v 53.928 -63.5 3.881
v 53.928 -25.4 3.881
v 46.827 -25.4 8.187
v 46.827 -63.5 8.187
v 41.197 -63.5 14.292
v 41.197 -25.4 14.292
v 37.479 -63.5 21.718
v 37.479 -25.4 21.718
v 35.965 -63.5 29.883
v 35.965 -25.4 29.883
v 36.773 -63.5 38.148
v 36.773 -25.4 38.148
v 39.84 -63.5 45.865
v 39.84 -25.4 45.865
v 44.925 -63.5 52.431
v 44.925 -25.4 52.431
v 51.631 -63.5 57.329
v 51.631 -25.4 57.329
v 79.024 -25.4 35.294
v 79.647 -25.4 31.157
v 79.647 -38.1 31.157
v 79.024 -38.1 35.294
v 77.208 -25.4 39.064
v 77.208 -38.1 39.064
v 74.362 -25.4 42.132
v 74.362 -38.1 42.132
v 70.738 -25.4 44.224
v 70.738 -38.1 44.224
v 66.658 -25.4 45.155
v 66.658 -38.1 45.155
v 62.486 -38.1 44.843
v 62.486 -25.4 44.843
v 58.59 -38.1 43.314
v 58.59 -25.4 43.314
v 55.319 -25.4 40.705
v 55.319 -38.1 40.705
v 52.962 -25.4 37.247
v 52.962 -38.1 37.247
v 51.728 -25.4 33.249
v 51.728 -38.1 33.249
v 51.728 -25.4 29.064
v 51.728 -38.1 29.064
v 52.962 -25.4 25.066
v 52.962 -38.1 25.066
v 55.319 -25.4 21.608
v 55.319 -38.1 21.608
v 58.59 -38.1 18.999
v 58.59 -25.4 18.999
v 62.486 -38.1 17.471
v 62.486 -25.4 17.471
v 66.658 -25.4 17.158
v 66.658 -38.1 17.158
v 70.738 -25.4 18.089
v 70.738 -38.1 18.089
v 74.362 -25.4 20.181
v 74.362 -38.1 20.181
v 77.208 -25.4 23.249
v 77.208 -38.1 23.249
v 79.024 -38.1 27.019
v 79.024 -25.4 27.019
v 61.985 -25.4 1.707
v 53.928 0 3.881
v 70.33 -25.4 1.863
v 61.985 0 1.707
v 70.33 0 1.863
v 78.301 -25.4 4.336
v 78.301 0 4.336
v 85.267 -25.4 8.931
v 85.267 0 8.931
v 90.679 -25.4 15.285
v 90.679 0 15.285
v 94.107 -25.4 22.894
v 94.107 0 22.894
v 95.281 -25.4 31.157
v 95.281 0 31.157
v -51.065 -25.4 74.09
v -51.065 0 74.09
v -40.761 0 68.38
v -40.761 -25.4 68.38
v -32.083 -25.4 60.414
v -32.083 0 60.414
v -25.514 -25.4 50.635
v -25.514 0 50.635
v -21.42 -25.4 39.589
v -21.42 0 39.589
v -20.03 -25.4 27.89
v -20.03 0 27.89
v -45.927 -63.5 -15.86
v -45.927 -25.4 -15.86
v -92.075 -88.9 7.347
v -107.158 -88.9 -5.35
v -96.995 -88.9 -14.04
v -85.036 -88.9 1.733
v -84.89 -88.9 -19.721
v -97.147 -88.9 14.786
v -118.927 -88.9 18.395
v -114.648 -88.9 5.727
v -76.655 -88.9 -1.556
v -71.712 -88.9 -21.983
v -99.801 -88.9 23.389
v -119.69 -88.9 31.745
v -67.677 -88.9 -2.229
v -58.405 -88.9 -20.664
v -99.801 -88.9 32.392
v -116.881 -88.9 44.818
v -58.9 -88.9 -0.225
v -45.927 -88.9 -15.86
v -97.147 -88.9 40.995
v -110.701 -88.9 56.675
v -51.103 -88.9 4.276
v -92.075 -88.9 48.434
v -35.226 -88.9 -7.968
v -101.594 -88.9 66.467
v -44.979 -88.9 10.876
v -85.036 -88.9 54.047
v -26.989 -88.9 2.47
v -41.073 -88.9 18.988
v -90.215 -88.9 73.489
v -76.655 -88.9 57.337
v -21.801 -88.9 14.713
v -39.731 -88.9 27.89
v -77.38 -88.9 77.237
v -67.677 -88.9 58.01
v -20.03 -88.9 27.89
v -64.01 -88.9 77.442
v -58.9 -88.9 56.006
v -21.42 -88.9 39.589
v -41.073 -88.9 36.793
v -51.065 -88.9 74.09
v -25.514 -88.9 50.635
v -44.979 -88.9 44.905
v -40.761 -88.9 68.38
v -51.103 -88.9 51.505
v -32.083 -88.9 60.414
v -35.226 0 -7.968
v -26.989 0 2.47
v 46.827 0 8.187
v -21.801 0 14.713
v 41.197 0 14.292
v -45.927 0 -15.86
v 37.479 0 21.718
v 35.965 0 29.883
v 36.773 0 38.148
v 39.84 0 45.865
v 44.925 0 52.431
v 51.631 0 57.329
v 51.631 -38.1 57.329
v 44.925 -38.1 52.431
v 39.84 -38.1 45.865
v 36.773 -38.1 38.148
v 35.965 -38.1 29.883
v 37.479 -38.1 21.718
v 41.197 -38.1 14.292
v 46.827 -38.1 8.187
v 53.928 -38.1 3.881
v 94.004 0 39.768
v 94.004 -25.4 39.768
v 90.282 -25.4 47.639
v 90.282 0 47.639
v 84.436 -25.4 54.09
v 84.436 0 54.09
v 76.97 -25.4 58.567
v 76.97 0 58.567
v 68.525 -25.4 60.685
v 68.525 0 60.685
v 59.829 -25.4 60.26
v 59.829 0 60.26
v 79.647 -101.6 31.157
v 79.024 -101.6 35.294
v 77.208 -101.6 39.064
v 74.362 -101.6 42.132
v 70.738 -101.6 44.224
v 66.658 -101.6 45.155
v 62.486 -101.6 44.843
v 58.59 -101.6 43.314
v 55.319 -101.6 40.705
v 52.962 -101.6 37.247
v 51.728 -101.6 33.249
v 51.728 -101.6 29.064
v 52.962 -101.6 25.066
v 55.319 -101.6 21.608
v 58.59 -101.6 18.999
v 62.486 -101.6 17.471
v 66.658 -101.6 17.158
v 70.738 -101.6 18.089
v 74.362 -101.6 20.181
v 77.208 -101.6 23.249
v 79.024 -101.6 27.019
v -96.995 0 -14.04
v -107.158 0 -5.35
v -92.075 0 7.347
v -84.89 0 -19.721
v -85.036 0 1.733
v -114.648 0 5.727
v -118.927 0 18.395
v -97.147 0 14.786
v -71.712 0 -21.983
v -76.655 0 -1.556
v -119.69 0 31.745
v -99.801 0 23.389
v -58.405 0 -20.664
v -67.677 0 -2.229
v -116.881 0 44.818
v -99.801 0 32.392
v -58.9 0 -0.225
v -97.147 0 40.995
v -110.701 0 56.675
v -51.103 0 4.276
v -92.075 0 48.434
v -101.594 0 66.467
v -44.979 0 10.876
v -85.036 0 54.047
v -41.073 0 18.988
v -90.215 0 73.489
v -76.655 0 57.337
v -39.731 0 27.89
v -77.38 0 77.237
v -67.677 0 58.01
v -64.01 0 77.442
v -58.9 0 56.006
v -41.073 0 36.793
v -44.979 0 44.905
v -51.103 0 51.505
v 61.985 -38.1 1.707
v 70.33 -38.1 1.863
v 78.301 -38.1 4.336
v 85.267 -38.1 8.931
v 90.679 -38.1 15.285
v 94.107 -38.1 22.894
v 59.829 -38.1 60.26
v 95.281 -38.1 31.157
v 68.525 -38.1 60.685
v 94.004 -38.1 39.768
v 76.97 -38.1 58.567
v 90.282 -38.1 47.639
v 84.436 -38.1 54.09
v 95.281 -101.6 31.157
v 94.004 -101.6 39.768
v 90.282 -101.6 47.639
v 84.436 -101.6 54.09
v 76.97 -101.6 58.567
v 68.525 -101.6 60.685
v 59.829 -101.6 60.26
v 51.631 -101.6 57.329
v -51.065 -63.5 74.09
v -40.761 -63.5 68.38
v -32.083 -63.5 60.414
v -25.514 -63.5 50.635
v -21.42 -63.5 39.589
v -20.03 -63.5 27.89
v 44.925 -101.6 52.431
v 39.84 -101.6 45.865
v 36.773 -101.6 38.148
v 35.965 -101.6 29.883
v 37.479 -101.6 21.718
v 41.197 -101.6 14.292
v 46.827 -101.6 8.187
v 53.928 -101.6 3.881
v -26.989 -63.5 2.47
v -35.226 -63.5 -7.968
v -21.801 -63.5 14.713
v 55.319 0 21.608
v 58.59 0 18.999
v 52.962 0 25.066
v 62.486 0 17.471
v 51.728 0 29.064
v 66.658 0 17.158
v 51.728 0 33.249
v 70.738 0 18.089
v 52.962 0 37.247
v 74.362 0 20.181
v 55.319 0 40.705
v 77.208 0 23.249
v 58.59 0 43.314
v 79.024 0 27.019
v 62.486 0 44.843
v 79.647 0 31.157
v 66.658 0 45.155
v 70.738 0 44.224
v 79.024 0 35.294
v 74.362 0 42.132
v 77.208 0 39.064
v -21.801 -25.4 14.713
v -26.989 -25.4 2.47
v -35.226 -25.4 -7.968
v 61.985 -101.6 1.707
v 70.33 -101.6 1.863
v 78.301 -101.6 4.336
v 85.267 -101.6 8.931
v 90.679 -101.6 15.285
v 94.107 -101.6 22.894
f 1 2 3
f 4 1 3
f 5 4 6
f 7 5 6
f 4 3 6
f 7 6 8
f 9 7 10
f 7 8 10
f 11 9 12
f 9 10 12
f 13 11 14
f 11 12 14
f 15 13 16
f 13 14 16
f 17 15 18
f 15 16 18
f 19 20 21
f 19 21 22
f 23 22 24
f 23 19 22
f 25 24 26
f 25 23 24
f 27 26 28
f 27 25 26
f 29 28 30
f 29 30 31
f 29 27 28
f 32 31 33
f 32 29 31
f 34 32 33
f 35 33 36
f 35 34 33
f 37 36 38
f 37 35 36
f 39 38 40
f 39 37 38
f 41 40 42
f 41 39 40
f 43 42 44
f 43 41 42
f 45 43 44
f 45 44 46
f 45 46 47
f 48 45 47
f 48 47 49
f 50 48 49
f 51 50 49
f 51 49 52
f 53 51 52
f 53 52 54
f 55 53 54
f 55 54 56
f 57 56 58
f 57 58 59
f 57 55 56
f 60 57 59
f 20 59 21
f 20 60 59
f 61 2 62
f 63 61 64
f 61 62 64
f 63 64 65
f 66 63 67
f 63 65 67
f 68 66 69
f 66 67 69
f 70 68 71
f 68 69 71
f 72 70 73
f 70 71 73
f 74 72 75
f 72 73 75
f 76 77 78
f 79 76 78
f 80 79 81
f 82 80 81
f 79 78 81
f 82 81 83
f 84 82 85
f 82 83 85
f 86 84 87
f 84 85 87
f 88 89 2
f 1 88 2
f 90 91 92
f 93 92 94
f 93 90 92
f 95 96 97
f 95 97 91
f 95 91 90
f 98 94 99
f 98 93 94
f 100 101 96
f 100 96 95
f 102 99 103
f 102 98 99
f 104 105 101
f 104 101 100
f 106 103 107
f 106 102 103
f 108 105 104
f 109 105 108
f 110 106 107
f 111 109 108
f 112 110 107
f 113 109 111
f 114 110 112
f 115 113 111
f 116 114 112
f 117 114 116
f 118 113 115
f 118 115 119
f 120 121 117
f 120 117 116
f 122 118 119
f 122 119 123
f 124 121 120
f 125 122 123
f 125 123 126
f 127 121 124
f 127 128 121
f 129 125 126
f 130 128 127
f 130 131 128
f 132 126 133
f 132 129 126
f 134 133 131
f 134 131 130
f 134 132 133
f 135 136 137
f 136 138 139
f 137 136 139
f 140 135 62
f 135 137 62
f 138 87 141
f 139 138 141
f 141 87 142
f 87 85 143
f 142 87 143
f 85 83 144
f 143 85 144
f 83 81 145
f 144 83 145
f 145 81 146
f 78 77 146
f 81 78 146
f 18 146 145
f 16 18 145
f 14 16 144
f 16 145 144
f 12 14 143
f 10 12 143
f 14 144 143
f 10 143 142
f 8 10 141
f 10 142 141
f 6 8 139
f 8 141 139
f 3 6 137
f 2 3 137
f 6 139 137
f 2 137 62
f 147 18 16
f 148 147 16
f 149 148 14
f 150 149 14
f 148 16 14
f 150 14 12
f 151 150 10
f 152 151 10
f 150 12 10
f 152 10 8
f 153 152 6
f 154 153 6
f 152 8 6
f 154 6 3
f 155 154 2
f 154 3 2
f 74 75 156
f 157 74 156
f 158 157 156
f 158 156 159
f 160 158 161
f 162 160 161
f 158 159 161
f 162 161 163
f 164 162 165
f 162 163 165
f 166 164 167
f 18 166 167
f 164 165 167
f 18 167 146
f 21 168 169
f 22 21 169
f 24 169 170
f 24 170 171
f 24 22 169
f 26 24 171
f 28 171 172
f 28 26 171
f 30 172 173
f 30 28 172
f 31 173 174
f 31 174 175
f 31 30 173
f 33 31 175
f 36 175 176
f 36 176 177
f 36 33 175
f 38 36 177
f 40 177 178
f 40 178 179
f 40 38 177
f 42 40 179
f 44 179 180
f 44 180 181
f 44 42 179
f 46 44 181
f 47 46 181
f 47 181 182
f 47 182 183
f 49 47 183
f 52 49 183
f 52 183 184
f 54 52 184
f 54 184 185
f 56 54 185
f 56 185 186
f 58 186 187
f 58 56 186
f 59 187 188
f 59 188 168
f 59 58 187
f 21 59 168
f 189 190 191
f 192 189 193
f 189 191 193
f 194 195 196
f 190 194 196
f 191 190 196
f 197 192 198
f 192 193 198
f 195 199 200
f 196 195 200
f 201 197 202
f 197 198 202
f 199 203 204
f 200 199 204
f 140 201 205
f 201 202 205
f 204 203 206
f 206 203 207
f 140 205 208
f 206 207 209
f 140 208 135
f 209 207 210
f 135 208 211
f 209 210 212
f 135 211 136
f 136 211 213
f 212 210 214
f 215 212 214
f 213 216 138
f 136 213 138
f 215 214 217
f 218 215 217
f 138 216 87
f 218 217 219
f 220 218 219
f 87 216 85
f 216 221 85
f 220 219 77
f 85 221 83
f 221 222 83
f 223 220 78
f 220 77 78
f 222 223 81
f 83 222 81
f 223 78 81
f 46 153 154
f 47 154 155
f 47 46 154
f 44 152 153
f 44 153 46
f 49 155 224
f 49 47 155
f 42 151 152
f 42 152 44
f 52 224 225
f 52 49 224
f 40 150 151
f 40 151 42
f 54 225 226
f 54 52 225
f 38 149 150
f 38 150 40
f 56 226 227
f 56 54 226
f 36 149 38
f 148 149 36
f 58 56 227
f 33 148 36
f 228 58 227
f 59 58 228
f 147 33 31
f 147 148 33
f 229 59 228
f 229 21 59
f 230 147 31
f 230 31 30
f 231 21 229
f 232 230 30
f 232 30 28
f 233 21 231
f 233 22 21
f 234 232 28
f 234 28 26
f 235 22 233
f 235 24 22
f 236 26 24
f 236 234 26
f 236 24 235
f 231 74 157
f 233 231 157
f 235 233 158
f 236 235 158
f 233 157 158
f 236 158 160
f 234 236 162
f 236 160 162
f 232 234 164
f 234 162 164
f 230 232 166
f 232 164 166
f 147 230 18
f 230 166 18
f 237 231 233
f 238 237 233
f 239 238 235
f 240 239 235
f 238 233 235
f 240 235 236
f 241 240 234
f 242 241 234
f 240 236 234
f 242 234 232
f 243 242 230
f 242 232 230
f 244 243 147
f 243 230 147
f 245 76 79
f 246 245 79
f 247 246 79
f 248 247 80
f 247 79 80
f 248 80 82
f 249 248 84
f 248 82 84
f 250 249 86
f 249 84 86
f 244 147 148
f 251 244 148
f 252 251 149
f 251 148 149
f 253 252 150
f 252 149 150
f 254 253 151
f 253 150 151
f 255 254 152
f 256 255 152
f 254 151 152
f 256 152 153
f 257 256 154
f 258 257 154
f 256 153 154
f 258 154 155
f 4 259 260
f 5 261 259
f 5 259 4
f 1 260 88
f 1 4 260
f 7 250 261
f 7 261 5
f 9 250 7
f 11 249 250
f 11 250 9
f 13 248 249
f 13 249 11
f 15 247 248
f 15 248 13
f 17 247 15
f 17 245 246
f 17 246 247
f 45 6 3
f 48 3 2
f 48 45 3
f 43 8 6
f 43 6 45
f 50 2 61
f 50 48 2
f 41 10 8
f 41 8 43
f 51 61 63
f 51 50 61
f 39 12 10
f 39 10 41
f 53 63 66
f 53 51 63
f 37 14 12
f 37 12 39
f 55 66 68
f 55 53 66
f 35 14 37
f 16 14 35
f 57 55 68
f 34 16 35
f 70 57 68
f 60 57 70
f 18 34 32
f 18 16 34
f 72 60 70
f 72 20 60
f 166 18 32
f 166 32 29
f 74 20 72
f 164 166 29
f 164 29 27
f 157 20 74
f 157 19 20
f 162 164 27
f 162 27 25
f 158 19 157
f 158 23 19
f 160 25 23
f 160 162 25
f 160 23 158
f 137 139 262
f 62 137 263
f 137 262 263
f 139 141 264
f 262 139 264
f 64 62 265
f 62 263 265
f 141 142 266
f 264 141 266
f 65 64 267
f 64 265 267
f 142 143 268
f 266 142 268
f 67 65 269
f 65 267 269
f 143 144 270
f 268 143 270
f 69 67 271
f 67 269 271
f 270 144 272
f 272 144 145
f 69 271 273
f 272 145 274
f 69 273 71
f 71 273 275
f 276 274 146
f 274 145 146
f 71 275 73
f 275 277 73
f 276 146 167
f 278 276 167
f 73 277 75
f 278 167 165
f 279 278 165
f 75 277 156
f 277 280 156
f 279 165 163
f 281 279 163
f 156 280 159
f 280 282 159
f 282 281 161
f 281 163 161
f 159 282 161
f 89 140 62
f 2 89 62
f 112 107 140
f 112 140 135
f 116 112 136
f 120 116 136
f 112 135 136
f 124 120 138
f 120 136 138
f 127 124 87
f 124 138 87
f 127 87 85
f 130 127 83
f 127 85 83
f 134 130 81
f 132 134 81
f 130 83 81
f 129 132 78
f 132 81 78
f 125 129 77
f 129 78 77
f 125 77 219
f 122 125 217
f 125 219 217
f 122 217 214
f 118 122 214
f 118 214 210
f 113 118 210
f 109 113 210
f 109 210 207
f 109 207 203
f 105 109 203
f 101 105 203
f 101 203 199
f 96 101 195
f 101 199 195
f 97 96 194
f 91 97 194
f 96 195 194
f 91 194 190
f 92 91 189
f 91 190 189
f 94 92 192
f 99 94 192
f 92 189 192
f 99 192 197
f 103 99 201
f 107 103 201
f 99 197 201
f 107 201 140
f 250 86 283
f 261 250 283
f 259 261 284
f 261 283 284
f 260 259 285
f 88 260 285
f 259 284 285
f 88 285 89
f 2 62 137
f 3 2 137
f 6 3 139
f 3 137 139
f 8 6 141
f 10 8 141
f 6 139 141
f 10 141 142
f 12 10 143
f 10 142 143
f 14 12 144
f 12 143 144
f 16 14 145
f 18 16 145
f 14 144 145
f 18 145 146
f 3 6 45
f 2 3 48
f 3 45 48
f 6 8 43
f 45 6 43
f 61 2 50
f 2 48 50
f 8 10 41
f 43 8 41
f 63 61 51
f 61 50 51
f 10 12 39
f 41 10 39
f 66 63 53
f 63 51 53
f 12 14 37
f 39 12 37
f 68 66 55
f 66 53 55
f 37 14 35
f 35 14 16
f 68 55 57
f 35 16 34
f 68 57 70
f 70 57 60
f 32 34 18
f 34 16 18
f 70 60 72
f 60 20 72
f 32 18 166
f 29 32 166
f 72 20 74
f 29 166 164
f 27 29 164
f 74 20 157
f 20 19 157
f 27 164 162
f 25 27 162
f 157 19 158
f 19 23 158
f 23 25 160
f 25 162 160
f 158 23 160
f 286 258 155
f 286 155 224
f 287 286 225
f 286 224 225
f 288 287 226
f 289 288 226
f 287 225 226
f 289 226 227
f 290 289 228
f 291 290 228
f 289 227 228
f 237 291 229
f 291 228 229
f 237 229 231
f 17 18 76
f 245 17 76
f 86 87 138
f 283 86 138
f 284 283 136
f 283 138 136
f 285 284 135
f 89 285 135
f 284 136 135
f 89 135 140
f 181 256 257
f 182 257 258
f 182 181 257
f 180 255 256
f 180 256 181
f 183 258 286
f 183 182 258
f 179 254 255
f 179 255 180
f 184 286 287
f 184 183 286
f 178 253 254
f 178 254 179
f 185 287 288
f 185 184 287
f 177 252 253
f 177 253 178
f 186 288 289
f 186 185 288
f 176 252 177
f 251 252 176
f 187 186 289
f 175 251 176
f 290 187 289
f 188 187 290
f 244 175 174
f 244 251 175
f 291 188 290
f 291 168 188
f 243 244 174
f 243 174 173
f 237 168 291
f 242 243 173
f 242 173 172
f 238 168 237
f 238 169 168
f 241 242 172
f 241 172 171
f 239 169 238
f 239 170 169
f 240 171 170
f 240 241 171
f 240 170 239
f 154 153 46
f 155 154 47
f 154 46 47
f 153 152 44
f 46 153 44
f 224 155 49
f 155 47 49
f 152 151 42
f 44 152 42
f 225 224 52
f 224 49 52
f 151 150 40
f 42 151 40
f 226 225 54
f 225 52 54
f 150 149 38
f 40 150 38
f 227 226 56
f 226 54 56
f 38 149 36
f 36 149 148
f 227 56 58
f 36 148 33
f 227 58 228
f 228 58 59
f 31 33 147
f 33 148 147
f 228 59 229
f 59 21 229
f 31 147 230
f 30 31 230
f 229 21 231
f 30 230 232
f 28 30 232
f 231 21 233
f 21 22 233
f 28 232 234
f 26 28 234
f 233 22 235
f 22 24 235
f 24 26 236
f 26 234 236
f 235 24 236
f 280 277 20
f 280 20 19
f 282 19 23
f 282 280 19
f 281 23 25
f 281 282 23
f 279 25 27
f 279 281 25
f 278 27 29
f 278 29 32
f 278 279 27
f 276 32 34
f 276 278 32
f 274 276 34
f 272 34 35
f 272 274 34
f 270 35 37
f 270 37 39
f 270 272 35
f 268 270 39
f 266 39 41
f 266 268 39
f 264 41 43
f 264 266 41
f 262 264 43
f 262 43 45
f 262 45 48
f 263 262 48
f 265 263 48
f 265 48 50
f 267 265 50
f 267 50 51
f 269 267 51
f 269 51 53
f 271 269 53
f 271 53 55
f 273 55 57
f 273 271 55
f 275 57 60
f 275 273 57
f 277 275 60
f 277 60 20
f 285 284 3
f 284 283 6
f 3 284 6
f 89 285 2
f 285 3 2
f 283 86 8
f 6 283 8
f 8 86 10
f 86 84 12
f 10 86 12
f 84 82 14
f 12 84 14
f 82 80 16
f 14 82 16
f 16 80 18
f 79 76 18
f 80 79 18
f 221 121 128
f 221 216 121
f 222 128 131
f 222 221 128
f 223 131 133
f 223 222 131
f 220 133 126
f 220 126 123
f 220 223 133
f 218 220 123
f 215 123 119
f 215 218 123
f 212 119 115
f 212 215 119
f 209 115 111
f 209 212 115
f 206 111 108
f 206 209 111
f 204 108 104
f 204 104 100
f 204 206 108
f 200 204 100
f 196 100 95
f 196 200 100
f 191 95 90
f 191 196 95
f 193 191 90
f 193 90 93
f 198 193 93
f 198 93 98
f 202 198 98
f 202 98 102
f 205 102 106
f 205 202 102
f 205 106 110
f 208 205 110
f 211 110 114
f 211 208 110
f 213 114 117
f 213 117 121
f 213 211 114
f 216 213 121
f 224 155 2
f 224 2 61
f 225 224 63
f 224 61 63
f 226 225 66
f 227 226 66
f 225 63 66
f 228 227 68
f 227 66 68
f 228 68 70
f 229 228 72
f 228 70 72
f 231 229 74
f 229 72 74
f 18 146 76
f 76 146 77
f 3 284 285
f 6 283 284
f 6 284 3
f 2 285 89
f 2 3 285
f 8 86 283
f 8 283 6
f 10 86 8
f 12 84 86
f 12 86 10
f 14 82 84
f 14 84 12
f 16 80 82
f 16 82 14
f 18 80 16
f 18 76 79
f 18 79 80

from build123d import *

# Parameters (mm, degrees)
F0_R     = 14.0379672149
F2_DEPTH = 25.4
F0_R_2   = 30.2035472703
F4_DEPTH = 63.5
F5_DEPTH = 38.1
F6_DEPTH = 12.7
F7_DEPTH = 63.5


with BuildPart() as f2:
    # F0 (on Front) → F2 (new body)
    with BuildSketch(Plane.XZ):
        with BuildLine():
            ThreePointArc((95.2809938719, 31.1565697193), (80.867987619, 56.6041793229), (51.6312028736, 57.3294389535))
            ThreePointArc((51.6312028736, 57.3294389535), (35.965029482, 29.8828413836), (53.9277169218, 3.88117669))
            ThreePointArc((53.9277169218, 3.88117669), (81.9463228304, 6.3874327773), (95.2809938719, 31.1565697193))
        make_face()
        with Locations((65.6093358994, 31.1565697193)):
            Circle(F0_R, mode=Mode.SUBTRACT)
    extrude(amount=F2_DEPTH)


with BuildPart() as f2b:
    # F0 (on Front) → F2, piece 2 (new body)
    with BuildSketch(Plane.XZ):
        with BuildLine():
            ThreePointArc((-45.9266097252, -15.8601469004), (-26.9891091759, 2.4701327863), (-20.0295753742, 27.890458703))
            ThreePointArc((-20.0295753742, 27.890458703), (-28.508832265, 55.7187391388), (-51.0652040106, 74.0904860103))
            ThreePointArc((-51.0652040106, 74.0904860103), (-119.7579132685, 25.0441972115), (-45.9266097252, -15.8601469004))
        make_face()
        with Locations((-69.934360683, 27.890458703)):
            Circle(F0_R_2, mode=Mode.SUBTRACT)
    extrude(amount=F2_DEPTH)

    # F4 (add): a face of the model
    f4_faces = [f2b.faces().sort_by_distance(p)[0] for p in [
        (-93.2630699006, -25.4, 70.4036103104),
    ]]
    extrude(f4_faces, amount=F4_DEPTH)


with BuildPart() as f2c:
    # F1 (on face) → F2, piece 3 (new body)
    with BuildSketch(Plane.XZ):
        with BuildLine():
            Line((51.6312028736, 57.3294389535), (-51.0652040106, 74.0904860103))
            ThreePointArc((-51.0652040106, 74.0904860103), (-28.508832265, 55.7187391388), (-20.0295753742, 27.890458703))
            ThreePointArc((-20.0295753742, 27.890458703), (-26.9891091759, 2.4701327863), (-45.9266097252, -15.8601469004))
            Line((-45.9266097252, -15.8601469004), (53.9277169218, 3.88117669))
            ThreePointArc((53.9277169218, 3.88117669), (35.965029482, 29.8828413836), (51.6312028736, 57.3294389535))
        make_face()
    extrude(amount=F2_DEPTH)


with BuildPart() as f5:
    # F5 (new): a face of the model
    f5_faces = [f2c.part.faces().sort_by_distance(p)[0] for p in [
        (4.6663814886, -25.4, 29.8185425635),
    ]]
    extrude(f5_faces, amount=F5_DEPTH)


with BuildPart() as f6:
    # F6 (new): a face of the model
    f6_faces = [f2.part.faces().sort_by_distance(p)[0] for p in [
        (76.9605487971, -25.4, 57.6604981338),
    ]]
    extrude(f6_faces, amount=F6_DEPTH)


with BuildPart() as f7:
    # F7 (new): a face of the model
    f7_faces = [f6.part.faces().sort_by_distance(p)[0] for p in [
        (76.9605487971, -38.1, 57.6604981338),
    ]]
    extrude(f7_faces, amount=F7_DEPTH)


solid = Compound([f2.part, f2b.part, f2c.part, f5.part, f6.part, f7.part])
